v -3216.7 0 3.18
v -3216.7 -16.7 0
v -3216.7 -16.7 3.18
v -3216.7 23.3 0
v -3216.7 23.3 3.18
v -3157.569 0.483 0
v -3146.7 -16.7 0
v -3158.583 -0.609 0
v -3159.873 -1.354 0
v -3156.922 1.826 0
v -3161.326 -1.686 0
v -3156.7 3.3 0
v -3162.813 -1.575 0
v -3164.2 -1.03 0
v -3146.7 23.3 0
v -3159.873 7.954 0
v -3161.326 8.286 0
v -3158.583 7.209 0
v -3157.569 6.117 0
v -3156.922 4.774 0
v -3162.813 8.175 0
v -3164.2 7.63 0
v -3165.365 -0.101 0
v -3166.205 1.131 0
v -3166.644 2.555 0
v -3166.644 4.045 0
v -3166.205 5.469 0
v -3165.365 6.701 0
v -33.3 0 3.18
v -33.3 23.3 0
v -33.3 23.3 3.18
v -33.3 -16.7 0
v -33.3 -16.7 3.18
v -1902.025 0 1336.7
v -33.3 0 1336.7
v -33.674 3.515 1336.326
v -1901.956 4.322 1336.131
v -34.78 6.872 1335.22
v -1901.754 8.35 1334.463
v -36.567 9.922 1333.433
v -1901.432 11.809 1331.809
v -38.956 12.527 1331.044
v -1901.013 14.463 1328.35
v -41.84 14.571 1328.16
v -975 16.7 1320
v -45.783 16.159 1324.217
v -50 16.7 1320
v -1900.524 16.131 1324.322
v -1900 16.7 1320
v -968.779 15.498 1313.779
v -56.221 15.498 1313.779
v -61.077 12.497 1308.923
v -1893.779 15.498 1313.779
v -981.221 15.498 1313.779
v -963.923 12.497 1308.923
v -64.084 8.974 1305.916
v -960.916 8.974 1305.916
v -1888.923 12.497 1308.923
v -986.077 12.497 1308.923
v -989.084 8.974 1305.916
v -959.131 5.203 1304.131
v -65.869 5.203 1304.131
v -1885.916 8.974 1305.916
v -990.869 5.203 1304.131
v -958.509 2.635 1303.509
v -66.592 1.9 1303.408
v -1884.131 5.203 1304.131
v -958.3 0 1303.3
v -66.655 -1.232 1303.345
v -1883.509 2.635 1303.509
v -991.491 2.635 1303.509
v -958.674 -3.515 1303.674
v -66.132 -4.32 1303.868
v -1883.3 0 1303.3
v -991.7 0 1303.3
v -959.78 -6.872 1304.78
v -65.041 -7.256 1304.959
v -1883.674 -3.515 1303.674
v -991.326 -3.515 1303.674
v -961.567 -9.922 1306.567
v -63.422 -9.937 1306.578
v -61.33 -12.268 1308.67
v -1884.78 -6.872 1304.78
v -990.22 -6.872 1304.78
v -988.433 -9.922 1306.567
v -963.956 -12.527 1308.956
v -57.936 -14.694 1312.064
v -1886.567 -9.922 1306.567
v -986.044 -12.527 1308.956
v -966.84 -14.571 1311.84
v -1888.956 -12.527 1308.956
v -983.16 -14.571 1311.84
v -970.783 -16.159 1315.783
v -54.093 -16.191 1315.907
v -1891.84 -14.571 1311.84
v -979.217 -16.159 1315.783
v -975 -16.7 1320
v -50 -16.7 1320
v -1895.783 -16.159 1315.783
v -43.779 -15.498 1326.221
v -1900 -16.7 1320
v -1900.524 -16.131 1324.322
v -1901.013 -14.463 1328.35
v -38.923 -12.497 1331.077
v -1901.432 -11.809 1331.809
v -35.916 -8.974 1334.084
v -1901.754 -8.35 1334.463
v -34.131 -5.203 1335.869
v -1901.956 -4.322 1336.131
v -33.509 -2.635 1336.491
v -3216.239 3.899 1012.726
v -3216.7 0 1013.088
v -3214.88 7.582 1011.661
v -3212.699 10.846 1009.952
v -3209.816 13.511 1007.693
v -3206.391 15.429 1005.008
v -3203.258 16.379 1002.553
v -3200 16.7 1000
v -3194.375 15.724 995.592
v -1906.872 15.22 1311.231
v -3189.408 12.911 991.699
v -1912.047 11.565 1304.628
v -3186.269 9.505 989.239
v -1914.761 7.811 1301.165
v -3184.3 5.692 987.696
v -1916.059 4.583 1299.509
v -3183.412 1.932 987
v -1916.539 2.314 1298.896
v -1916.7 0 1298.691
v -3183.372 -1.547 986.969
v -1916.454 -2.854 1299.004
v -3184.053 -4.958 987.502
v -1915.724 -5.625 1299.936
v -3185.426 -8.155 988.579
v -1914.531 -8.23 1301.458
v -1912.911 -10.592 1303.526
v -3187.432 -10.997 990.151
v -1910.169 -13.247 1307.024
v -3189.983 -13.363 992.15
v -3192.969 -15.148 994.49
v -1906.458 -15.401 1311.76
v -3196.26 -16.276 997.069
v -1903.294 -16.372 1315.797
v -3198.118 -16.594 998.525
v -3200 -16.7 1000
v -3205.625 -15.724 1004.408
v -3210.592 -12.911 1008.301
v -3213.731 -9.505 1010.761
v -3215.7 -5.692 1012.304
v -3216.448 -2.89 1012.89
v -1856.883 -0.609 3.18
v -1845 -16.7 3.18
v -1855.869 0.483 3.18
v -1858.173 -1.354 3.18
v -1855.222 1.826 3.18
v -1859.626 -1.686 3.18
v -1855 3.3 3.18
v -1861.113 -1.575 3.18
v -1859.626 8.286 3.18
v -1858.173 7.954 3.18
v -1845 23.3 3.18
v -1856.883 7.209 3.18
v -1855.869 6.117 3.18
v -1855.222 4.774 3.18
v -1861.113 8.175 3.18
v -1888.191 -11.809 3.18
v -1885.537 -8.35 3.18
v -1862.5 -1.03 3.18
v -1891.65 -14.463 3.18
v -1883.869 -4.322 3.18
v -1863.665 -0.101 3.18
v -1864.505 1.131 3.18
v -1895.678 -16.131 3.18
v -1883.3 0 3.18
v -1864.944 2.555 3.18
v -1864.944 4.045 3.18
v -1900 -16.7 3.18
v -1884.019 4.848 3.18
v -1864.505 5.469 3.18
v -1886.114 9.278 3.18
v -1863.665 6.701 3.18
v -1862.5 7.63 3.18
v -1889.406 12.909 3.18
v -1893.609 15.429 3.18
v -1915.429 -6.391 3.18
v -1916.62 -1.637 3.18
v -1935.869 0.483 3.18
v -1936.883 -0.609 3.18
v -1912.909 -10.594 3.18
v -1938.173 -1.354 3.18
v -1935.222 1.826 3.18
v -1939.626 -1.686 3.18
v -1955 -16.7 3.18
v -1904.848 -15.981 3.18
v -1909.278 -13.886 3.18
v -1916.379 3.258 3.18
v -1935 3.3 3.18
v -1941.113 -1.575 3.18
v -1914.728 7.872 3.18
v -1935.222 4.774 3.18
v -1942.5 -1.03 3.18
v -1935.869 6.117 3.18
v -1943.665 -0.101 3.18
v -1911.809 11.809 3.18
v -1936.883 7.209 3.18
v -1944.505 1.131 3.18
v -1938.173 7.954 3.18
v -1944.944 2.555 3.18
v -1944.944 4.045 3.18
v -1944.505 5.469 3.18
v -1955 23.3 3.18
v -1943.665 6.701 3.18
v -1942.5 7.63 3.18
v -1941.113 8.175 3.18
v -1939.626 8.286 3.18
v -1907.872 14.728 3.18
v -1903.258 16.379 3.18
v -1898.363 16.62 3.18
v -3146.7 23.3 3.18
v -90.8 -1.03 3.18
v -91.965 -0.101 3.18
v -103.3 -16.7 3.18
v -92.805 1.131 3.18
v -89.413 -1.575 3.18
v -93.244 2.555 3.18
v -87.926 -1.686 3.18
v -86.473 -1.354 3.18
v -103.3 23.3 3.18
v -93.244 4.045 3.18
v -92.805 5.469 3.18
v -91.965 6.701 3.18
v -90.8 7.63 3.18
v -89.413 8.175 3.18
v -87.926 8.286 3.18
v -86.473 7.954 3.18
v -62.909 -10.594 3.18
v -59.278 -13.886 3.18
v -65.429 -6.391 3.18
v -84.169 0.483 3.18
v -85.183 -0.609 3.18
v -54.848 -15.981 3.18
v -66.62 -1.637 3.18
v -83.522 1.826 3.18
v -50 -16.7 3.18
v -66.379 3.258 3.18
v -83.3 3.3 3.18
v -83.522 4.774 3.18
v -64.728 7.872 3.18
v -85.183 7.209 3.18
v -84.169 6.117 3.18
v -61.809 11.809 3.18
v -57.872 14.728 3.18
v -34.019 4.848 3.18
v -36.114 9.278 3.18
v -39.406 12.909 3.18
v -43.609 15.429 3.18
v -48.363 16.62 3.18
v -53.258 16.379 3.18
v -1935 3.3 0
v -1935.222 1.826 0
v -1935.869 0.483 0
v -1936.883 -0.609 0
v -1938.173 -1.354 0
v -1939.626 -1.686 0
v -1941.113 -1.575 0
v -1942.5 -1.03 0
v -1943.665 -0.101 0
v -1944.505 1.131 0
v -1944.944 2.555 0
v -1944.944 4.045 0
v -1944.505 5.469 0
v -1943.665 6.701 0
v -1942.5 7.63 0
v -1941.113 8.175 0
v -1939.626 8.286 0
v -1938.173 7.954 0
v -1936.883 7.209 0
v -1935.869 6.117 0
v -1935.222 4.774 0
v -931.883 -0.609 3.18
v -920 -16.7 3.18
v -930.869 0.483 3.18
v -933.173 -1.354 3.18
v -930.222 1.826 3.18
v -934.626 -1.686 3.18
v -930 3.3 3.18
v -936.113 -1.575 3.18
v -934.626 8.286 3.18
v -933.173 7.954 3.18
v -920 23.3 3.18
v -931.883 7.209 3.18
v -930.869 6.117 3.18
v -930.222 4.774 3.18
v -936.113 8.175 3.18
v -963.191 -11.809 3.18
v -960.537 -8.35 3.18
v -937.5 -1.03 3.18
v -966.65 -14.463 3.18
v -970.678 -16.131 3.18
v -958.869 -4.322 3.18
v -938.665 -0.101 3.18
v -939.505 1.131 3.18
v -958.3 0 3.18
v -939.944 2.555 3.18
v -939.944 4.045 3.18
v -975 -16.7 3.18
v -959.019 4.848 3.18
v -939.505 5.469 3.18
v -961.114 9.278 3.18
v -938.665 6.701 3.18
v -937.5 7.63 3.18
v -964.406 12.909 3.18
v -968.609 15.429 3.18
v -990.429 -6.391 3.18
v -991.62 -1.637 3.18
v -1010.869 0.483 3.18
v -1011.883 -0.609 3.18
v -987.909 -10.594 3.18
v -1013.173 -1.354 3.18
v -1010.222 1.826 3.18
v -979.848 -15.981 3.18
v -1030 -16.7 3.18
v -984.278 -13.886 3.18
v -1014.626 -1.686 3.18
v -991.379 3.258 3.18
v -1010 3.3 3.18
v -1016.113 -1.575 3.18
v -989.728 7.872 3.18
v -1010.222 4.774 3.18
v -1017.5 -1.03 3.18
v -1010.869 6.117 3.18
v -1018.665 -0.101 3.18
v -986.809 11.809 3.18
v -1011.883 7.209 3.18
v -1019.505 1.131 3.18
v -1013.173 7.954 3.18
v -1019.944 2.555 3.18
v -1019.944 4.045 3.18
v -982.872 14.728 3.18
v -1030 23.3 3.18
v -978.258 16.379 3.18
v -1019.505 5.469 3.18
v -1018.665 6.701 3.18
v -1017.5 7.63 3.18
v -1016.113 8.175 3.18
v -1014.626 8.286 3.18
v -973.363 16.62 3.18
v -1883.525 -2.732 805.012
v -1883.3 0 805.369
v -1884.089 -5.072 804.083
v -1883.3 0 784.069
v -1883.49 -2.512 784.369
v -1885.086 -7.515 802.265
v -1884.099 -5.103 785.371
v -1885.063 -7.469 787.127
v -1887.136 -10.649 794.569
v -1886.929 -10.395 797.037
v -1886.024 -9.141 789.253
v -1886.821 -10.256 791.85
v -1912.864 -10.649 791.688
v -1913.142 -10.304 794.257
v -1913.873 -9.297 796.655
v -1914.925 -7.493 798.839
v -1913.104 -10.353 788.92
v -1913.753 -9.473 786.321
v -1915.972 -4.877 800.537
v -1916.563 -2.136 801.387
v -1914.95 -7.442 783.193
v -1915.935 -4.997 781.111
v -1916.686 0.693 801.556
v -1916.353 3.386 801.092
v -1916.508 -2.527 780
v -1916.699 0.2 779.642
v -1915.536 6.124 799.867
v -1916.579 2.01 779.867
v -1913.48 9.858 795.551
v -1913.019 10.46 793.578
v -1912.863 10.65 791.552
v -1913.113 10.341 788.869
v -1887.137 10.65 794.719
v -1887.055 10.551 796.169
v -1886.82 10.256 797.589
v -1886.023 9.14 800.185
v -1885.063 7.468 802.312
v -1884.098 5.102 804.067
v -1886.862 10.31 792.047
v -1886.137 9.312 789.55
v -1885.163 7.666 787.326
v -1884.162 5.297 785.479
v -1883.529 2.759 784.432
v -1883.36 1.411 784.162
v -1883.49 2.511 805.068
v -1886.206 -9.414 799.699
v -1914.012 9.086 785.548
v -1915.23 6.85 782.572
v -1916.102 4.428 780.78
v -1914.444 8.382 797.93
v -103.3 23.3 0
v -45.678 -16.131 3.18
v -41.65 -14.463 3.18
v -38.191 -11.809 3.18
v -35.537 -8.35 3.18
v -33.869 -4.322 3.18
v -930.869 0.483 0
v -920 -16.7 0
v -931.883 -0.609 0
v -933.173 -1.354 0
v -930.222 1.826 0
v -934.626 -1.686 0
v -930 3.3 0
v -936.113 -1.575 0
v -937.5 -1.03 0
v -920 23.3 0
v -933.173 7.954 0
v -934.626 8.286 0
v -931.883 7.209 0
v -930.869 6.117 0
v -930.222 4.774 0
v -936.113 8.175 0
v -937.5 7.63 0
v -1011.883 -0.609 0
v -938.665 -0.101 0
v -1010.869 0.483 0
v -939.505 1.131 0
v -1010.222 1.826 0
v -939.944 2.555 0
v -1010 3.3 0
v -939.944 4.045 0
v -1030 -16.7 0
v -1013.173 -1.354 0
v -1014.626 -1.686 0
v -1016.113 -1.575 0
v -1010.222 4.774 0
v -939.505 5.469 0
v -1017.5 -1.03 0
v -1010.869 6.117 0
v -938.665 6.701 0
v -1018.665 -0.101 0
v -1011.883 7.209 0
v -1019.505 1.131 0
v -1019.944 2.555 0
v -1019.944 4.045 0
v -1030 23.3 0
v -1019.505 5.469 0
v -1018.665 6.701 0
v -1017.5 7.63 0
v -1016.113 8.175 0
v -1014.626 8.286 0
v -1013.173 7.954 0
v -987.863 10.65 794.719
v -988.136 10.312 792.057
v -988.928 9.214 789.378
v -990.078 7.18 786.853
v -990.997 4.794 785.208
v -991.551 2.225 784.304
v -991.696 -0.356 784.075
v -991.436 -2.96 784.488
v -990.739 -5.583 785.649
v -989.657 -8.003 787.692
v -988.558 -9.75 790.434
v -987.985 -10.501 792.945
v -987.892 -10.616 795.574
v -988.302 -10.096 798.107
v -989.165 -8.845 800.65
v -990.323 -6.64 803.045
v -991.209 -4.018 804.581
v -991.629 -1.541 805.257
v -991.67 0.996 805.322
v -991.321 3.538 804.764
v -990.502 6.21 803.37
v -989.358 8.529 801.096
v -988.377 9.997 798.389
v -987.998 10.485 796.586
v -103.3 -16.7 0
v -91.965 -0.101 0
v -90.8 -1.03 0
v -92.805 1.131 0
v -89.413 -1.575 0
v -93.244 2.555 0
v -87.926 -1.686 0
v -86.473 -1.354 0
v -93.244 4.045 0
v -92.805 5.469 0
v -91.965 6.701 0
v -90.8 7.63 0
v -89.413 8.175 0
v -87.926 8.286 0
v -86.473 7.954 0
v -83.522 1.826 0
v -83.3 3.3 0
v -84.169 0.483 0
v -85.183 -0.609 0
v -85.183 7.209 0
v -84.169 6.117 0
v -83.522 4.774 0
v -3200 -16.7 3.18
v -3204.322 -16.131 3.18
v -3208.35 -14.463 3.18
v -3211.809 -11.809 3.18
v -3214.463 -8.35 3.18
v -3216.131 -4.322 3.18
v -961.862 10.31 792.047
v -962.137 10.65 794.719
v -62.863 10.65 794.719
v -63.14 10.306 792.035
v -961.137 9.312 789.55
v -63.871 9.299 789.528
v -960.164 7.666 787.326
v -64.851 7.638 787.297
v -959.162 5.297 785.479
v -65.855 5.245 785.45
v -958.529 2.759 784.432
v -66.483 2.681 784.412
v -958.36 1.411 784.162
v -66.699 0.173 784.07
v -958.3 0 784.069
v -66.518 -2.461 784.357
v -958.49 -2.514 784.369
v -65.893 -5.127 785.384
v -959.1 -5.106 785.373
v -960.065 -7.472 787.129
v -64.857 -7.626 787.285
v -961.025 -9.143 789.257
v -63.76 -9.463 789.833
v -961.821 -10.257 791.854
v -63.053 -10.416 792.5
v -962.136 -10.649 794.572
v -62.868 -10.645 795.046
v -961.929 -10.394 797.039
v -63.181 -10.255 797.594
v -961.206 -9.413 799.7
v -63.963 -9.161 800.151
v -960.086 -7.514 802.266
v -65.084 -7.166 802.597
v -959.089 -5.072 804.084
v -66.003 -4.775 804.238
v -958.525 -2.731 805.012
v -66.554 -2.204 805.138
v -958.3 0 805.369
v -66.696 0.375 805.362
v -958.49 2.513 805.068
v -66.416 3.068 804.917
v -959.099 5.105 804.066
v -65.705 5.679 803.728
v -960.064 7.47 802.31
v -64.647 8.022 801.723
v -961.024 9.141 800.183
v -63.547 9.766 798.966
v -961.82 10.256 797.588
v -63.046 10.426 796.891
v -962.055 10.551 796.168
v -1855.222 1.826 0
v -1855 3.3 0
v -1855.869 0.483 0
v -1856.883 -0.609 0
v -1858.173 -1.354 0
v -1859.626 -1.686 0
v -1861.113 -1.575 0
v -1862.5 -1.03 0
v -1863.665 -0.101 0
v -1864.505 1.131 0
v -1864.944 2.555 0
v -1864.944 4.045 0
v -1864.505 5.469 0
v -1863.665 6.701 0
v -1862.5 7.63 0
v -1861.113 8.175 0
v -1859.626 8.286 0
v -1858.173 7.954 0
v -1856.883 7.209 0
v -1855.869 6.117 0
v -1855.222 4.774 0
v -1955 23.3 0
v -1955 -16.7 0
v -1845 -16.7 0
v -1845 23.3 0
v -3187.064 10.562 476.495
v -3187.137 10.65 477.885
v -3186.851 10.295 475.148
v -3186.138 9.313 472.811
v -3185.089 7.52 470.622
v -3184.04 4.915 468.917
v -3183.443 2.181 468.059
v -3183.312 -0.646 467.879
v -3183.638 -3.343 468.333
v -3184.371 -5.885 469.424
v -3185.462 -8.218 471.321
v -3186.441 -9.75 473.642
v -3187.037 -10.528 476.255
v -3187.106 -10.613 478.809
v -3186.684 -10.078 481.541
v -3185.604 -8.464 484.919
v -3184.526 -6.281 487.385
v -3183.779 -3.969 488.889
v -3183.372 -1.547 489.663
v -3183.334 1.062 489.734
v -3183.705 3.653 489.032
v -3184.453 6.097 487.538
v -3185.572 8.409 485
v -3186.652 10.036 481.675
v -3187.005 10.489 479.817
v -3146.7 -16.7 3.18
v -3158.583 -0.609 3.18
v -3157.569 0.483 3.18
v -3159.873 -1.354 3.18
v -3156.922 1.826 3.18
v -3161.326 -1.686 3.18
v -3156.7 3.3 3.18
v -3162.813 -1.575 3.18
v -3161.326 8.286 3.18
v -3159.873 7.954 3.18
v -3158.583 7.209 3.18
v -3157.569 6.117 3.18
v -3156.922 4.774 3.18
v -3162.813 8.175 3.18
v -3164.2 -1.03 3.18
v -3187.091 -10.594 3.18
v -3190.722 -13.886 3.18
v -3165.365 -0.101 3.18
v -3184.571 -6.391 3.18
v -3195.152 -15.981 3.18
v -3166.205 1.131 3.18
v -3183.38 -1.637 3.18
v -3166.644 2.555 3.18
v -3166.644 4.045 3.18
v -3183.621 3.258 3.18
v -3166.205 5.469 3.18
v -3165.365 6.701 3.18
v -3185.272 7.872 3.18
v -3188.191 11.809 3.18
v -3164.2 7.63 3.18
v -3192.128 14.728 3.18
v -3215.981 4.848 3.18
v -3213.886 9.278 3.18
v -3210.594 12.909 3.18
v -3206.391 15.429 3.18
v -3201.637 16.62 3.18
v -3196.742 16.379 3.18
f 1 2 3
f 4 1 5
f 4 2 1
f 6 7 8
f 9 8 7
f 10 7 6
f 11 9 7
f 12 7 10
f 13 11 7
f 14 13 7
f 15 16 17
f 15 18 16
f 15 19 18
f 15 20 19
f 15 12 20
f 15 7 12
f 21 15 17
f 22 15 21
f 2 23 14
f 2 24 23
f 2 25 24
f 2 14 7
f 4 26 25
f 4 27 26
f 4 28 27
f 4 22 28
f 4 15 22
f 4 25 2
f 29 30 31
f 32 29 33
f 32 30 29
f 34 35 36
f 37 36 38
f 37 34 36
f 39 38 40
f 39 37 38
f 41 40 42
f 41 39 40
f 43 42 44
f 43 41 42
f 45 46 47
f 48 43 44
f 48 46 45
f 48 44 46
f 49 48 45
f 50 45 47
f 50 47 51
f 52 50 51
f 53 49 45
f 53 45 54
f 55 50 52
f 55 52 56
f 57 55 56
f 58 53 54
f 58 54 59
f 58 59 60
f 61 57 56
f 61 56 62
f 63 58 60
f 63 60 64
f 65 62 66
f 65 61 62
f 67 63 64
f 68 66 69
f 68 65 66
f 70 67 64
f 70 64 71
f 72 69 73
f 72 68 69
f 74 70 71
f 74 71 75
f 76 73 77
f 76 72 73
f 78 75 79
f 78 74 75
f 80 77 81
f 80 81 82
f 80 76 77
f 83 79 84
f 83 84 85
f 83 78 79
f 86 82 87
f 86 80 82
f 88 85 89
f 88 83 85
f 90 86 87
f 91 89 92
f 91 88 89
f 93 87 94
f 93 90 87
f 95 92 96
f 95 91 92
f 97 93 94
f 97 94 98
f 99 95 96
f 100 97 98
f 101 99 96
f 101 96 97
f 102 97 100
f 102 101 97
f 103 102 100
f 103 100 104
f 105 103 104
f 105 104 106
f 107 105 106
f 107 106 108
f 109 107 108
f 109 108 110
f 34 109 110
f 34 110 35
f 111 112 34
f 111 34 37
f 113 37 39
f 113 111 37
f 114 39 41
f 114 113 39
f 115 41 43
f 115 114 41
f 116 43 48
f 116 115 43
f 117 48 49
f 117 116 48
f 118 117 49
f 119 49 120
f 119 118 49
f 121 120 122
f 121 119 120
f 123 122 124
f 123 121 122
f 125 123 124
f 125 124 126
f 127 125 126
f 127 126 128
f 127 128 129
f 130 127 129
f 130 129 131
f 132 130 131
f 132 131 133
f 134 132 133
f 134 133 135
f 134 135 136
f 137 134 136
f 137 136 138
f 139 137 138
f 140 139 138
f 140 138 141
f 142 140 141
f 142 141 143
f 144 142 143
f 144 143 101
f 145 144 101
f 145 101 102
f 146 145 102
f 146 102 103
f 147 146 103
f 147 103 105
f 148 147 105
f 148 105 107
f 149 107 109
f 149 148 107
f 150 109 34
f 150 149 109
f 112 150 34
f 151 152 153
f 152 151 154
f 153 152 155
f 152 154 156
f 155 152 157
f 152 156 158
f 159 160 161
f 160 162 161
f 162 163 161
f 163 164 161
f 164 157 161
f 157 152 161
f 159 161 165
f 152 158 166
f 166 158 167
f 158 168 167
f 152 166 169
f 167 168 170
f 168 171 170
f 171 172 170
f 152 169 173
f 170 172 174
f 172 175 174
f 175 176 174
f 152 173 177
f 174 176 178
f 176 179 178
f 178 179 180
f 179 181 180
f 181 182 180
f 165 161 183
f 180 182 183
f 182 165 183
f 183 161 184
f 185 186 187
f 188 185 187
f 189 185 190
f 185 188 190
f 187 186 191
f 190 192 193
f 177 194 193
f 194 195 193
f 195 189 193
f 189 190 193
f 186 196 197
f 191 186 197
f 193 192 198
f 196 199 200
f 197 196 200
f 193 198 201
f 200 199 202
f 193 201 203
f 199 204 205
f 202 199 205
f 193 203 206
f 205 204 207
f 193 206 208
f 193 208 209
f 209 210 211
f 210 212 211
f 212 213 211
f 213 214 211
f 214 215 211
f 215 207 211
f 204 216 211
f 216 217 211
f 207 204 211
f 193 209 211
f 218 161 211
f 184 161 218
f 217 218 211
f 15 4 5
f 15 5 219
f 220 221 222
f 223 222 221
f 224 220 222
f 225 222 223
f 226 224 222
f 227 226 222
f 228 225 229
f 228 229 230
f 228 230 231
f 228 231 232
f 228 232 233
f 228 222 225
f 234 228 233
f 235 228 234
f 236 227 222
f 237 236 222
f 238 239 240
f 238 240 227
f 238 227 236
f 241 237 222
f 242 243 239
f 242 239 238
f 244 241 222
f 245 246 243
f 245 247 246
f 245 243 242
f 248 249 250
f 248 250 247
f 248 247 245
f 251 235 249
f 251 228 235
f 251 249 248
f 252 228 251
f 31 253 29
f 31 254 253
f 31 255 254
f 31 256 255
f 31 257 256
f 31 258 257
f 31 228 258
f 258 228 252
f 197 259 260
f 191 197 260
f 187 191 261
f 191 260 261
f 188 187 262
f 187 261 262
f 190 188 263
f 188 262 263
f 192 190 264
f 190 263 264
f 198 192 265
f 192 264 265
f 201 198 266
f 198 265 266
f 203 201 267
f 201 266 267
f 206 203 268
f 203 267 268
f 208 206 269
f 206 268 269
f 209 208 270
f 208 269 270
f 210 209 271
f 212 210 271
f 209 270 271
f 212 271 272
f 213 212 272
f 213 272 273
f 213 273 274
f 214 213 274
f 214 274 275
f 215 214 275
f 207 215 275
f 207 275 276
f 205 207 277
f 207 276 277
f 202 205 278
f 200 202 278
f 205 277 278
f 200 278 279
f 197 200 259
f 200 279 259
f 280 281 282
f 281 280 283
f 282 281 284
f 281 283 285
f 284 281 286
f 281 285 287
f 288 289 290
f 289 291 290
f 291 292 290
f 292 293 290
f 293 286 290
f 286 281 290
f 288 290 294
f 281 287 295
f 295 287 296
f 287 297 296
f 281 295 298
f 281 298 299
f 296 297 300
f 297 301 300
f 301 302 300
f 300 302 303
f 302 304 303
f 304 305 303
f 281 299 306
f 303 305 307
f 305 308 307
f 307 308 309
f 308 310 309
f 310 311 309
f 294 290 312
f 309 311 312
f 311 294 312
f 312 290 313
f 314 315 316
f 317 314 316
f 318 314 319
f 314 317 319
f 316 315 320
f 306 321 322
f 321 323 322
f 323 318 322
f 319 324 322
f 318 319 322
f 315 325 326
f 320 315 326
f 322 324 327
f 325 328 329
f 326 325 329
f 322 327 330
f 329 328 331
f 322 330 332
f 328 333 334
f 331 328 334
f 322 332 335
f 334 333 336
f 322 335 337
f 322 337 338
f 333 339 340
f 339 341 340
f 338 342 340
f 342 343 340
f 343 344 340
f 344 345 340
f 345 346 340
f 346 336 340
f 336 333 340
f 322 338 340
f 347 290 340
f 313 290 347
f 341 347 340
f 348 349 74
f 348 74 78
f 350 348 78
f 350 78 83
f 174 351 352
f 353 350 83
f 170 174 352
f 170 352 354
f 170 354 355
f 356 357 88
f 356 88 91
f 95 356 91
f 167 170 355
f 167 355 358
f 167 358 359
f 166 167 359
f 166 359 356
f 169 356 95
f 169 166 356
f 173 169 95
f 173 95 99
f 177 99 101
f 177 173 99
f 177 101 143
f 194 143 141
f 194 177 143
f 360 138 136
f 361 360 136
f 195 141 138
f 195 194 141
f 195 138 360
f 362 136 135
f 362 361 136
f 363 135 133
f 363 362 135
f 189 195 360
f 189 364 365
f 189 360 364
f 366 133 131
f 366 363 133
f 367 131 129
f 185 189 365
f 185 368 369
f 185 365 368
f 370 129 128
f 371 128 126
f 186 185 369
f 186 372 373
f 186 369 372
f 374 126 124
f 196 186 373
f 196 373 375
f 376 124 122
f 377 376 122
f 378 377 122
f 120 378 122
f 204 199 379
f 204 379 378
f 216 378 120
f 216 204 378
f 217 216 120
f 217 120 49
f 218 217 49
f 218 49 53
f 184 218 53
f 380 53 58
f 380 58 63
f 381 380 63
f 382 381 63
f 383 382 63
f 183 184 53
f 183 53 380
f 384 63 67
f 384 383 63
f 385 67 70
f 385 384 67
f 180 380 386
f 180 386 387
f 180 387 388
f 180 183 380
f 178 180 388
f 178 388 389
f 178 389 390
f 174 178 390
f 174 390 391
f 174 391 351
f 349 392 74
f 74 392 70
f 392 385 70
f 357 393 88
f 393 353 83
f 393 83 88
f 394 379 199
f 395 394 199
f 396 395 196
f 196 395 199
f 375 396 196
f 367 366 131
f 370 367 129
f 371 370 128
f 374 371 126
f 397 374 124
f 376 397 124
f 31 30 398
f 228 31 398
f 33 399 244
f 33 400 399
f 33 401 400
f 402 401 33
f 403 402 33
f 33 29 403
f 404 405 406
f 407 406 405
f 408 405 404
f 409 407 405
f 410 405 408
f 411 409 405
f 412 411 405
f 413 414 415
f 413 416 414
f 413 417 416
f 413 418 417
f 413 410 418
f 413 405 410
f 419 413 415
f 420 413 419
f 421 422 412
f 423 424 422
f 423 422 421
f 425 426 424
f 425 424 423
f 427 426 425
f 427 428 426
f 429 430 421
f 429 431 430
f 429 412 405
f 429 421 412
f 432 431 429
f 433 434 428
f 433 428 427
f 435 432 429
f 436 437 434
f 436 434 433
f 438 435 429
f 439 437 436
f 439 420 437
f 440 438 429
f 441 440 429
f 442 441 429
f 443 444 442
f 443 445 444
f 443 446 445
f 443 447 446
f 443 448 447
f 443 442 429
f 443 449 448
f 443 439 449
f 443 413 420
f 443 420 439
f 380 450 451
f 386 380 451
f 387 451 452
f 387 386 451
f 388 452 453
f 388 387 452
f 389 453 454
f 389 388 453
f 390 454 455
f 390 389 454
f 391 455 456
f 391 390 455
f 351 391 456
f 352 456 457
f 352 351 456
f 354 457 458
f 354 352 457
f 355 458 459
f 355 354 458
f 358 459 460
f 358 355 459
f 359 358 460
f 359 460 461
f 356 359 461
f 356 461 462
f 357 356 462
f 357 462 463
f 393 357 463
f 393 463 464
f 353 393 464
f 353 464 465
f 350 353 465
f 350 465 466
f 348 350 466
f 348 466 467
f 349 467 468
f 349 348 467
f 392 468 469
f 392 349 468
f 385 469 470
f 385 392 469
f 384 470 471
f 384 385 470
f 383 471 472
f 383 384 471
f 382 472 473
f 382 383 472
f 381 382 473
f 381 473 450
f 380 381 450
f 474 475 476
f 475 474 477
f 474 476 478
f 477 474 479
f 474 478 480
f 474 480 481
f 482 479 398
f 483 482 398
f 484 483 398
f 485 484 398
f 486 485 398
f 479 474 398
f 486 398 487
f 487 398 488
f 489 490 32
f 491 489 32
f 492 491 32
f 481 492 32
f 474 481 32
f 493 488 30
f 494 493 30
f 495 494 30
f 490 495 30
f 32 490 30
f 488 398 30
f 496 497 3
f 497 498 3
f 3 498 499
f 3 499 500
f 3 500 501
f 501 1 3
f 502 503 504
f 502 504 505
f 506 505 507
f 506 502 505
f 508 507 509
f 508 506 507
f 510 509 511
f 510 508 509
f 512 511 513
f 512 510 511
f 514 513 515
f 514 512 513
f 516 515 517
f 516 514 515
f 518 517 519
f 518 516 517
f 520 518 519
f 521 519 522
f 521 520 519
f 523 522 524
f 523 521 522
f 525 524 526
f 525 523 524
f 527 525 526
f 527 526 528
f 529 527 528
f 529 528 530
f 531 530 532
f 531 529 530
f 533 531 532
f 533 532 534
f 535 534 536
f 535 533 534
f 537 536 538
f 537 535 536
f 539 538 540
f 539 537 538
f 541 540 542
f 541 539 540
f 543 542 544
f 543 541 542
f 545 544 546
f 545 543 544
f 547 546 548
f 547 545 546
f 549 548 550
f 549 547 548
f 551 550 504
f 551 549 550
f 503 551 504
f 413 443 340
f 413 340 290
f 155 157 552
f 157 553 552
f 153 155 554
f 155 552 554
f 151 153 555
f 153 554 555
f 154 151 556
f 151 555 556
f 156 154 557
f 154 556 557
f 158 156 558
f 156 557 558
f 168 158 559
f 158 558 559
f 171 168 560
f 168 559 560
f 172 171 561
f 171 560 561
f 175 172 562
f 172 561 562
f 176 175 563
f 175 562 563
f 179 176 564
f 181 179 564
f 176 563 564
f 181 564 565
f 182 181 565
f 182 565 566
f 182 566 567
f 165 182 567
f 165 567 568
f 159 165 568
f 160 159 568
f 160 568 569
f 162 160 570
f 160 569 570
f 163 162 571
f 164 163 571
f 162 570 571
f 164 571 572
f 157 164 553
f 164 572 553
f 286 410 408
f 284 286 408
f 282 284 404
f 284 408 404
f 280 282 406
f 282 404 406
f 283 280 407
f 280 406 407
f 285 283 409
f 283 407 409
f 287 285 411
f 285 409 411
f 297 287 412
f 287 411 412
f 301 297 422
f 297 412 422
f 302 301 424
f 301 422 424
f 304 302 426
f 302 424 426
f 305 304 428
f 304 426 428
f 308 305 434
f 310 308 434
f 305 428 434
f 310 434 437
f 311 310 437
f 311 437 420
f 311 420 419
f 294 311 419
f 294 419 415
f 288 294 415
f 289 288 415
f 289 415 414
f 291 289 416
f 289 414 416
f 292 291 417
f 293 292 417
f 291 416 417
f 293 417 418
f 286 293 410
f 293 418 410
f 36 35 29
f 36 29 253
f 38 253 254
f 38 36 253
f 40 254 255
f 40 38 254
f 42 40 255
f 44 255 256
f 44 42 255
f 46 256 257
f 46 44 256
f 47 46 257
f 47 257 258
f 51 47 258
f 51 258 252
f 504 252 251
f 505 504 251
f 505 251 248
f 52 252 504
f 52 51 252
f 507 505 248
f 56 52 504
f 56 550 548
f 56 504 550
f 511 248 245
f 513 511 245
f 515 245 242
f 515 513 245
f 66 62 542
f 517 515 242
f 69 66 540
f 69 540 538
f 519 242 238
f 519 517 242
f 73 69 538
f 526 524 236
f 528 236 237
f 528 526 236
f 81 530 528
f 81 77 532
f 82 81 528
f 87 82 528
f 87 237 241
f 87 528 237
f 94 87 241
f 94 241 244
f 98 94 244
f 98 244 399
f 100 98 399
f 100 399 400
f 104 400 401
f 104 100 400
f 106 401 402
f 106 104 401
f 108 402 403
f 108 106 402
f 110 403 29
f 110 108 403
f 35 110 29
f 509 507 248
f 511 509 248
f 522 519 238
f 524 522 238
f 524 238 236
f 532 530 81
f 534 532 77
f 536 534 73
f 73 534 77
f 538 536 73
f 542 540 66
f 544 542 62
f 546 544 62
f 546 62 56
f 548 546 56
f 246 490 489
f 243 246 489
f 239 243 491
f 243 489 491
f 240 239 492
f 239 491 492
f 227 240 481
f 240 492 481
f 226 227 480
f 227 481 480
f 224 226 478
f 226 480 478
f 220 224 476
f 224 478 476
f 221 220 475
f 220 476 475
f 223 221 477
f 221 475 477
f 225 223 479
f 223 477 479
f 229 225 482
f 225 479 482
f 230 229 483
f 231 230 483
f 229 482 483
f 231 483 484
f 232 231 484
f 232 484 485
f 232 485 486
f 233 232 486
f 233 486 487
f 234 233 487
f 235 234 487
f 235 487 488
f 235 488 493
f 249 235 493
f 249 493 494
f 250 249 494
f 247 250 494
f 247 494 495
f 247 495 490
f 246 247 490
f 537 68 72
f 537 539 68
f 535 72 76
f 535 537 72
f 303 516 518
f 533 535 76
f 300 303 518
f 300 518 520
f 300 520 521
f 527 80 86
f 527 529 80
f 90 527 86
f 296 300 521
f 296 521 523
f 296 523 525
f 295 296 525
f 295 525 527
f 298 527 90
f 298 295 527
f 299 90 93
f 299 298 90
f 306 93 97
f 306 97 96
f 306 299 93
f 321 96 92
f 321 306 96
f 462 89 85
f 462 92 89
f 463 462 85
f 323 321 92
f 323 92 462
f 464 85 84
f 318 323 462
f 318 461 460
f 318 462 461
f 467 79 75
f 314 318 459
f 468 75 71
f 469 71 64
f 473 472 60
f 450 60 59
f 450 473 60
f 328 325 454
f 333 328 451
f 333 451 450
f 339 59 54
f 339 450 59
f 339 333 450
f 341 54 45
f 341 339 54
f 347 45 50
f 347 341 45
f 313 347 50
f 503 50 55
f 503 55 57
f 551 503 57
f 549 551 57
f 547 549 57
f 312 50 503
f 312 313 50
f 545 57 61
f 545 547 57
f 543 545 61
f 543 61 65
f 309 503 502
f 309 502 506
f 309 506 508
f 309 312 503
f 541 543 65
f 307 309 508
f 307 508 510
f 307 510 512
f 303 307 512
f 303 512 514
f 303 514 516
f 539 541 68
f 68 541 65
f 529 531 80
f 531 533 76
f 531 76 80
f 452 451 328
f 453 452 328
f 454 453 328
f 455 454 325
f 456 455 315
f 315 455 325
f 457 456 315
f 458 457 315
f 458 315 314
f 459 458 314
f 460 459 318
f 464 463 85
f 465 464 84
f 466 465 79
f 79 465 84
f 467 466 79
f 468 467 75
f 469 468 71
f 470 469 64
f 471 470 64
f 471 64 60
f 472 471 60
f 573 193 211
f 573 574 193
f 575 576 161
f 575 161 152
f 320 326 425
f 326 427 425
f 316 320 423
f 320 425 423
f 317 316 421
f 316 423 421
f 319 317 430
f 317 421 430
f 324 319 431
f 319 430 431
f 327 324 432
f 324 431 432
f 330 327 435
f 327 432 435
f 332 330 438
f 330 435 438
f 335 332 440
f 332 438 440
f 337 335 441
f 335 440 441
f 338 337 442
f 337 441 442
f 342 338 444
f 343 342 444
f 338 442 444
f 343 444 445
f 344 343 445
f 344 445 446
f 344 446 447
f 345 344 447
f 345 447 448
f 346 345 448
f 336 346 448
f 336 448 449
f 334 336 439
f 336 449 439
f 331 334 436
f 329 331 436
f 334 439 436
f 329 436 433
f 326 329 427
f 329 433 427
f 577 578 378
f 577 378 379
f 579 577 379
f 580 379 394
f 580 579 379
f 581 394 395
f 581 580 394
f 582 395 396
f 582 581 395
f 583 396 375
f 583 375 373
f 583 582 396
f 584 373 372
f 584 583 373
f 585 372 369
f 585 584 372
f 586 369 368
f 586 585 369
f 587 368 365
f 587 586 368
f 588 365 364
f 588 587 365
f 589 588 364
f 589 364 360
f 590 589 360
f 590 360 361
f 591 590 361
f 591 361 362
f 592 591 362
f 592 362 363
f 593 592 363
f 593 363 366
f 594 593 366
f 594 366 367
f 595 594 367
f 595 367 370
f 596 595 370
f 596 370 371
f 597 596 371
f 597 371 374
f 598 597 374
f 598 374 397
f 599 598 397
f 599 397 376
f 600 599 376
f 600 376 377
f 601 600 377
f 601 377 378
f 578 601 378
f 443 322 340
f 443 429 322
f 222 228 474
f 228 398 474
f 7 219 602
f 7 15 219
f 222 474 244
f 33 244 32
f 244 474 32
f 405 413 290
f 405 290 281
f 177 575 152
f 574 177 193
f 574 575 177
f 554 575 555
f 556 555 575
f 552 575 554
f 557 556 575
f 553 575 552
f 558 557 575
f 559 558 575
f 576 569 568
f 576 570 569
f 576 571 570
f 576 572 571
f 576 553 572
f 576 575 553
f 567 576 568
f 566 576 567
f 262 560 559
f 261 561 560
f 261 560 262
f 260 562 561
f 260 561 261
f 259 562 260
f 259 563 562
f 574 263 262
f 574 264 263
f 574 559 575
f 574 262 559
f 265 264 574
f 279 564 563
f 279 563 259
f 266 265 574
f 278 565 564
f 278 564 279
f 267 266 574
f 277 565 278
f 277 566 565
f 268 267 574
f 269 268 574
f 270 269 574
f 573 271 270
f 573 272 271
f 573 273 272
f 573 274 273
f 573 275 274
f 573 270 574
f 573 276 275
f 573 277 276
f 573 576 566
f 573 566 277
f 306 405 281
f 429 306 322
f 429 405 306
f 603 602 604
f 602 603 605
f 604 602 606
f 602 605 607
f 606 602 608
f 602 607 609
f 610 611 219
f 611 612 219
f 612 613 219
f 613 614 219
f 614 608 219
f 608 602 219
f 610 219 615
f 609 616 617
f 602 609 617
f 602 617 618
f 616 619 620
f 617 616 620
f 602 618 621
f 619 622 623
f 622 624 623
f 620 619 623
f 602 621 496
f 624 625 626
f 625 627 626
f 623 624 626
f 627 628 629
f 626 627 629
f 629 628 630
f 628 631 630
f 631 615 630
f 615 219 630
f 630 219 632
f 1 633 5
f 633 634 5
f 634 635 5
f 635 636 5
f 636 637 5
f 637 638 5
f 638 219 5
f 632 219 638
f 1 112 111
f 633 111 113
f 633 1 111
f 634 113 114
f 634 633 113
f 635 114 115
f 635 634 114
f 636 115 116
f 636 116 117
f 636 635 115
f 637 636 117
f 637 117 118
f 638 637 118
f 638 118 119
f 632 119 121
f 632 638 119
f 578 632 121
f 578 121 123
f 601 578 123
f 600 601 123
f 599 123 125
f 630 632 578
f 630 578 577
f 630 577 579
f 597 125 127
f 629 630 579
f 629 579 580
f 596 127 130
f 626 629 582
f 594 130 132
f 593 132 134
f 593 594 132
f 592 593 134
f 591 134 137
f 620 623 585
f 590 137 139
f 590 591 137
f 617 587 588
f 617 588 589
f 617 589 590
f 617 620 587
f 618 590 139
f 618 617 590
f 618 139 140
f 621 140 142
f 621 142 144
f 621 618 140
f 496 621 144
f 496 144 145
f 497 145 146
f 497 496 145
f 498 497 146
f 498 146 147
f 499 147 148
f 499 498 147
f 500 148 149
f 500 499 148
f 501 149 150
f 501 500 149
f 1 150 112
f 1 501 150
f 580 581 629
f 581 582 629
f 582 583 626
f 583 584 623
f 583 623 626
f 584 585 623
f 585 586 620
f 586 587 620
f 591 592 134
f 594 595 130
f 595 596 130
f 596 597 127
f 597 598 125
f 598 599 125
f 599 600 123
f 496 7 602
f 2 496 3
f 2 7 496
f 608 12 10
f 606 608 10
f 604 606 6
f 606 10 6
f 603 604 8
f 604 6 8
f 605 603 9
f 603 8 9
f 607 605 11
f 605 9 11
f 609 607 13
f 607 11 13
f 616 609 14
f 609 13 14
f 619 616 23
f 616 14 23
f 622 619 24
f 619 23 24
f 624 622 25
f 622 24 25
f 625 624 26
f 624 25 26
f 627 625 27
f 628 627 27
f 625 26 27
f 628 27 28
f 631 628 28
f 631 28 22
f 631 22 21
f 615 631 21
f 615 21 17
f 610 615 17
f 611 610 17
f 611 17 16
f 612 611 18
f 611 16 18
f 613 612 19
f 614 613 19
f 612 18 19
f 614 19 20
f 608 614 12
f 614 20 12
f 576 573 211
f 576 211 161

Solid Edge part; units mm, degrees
sketch "Sketch1" plane through (0, 0, 0) normal (0, -1, 0) x (1, 0, 0)
  line L0 (-50, 0) -> (-50, 1320)
  line L1 (-50, 1320) -> (-1900, 1320)
  line L2 (-1900, 1320) -> (-3200, 1000)
  line L3 (-3200, 0) -> (-3200, 1000)
  dimension "D1" = 1000
  dimension "D2" = 3150
  dimension "D3" = 50
  dimension "D4" = 1320
  dimension "D5" = 1850
sketch "Sketch2" plane through (0, 0, 0) normal (0, 0, 1) x (1, 0, 0)
  circle A0 centre (-50, 0) radius 16.7
  dimension "D1" = 33.4
sweep "SweptProtrusion_1" add profiles "Sketch2" path "Sketch1"
sketch "Sketch3" plane through (0, 0, 0) normal (0, 0, 1) x (1, 0, 0)
  line L0 (-3216.7, 23.3) -> (-3146.7, 23.3)
  line L1 (-3146.7, 23.3) -> (-3146.7, -16.7)
  line L2 (-3146.7, -16.7) -> (-3216.7, -16.7)
  line L3 (-3216.7, -16.7) -> (-3216.7, 23.3)
  line L4 (-1955, 23.3) -> (-1845, 23.3)
  line L5 (-1845, 23.3) -> (-1845, -16.7)
  line L6 (-1845, -16.7) -> (-1955, -16.7)
  line L7 (-1955, -16.7) -> (-1955, 23.3)
  line L8 (-1030, 23.3) -> (-920, 23.3)
  line L9 (-920, 23.3) -> (-920, -16.7)
  line L10 (-920, -16.7) -> (-1030, -16.7)
  line L11 (-1030, -16.7) -> (-1030, 23.3)
  line L12 (-103.3, -16.7) -> (-33.3, -16.7)
  line L13 (-33.3, 23.3) -> (-33.3, -16.7)
  line L14 (-33.3, 23.3) -> (-103.3, 23.3)
  line L15 (-103.3, 23.3) -> (-103.3, -16.7)
  dimension "D1" = 70
  dimension "D2" = 40
  dimension "D3" = 110
  dimension "D4" = 40
  dimension "D5" = 40
  dimension "D6" = 110
  dimension "D7" = 925
  dimension "D8" = 70
  dimension "D9" = 925
extrude "ExtrudedProtrusion_1" add sketch "Sketch3" along normal blind 3.18
sketch "Sketch4" plane through (0, 0, 0) normal (0, 0, 1) x (1, 0, 0)
  circle A0 centre (-1900, 0) radius 16.7
  circle A1 centre (-975, 0) radius 16.7
  dimension "D1" = 975
  dimension "D2" = 925
extrude "Protrusion1" add sketch "Sketch4" along normal up to vertex (1320 mm away)
sketch "Sketch5" plane through (0, 0, 0) normal (0, -1, 0) x (1, 0, 0)
  line L0 (-50, 794.7186) -> (-1900, 794.7186)
  line L1 (-1900, 794.7186) -> (-3200, 474.7186)
  dimension "D1" = 1000
  dimension "D2" = 3150
  dimension "D3" = 50
  dimension "D4" = 1320
  dimension "D5" = 1850
sketch "Sketch6" plane through (-50, 0, 780) normal (1, 0, 0) x (0, 1, 0)
  circle A0 centre (0, 14.7186) radius 10.65
sweep "SweptProtrusion_2" add profiles "Sketch6" path "Sketch5"
sketch "Sketch7" plane through (-975, 3.3, 0) normal (0, 0, -1) x (1, 0, 0)
  circle A0 centre (-40, 0) radius 5
  circle A1 centre (40, 0) radius 5
  circle A2 centre (886.7, 0) radius 5
  circle A3 centre (-885, 0) radius 5
  circle A4 centre (-965, 0) radius 5
  circle A5 centre (-2186.7, 0) radius 5
  dimension "D1" = 15
  dimension "D2" = 10
  dimension "D3" = 15
  dimension "D4" = 15
  dimension "D5" = 10
  dimension "D6" = 10
  dimension "D7" = 15
  dimension "D8" = 15
  dimension "D9" = 10
  dimension "D10" = 10
  dimension "D11" = 10
  dimension "D12" = 15
extrude "Cutout1" cut sketch "Sketch7" against normal up to next
